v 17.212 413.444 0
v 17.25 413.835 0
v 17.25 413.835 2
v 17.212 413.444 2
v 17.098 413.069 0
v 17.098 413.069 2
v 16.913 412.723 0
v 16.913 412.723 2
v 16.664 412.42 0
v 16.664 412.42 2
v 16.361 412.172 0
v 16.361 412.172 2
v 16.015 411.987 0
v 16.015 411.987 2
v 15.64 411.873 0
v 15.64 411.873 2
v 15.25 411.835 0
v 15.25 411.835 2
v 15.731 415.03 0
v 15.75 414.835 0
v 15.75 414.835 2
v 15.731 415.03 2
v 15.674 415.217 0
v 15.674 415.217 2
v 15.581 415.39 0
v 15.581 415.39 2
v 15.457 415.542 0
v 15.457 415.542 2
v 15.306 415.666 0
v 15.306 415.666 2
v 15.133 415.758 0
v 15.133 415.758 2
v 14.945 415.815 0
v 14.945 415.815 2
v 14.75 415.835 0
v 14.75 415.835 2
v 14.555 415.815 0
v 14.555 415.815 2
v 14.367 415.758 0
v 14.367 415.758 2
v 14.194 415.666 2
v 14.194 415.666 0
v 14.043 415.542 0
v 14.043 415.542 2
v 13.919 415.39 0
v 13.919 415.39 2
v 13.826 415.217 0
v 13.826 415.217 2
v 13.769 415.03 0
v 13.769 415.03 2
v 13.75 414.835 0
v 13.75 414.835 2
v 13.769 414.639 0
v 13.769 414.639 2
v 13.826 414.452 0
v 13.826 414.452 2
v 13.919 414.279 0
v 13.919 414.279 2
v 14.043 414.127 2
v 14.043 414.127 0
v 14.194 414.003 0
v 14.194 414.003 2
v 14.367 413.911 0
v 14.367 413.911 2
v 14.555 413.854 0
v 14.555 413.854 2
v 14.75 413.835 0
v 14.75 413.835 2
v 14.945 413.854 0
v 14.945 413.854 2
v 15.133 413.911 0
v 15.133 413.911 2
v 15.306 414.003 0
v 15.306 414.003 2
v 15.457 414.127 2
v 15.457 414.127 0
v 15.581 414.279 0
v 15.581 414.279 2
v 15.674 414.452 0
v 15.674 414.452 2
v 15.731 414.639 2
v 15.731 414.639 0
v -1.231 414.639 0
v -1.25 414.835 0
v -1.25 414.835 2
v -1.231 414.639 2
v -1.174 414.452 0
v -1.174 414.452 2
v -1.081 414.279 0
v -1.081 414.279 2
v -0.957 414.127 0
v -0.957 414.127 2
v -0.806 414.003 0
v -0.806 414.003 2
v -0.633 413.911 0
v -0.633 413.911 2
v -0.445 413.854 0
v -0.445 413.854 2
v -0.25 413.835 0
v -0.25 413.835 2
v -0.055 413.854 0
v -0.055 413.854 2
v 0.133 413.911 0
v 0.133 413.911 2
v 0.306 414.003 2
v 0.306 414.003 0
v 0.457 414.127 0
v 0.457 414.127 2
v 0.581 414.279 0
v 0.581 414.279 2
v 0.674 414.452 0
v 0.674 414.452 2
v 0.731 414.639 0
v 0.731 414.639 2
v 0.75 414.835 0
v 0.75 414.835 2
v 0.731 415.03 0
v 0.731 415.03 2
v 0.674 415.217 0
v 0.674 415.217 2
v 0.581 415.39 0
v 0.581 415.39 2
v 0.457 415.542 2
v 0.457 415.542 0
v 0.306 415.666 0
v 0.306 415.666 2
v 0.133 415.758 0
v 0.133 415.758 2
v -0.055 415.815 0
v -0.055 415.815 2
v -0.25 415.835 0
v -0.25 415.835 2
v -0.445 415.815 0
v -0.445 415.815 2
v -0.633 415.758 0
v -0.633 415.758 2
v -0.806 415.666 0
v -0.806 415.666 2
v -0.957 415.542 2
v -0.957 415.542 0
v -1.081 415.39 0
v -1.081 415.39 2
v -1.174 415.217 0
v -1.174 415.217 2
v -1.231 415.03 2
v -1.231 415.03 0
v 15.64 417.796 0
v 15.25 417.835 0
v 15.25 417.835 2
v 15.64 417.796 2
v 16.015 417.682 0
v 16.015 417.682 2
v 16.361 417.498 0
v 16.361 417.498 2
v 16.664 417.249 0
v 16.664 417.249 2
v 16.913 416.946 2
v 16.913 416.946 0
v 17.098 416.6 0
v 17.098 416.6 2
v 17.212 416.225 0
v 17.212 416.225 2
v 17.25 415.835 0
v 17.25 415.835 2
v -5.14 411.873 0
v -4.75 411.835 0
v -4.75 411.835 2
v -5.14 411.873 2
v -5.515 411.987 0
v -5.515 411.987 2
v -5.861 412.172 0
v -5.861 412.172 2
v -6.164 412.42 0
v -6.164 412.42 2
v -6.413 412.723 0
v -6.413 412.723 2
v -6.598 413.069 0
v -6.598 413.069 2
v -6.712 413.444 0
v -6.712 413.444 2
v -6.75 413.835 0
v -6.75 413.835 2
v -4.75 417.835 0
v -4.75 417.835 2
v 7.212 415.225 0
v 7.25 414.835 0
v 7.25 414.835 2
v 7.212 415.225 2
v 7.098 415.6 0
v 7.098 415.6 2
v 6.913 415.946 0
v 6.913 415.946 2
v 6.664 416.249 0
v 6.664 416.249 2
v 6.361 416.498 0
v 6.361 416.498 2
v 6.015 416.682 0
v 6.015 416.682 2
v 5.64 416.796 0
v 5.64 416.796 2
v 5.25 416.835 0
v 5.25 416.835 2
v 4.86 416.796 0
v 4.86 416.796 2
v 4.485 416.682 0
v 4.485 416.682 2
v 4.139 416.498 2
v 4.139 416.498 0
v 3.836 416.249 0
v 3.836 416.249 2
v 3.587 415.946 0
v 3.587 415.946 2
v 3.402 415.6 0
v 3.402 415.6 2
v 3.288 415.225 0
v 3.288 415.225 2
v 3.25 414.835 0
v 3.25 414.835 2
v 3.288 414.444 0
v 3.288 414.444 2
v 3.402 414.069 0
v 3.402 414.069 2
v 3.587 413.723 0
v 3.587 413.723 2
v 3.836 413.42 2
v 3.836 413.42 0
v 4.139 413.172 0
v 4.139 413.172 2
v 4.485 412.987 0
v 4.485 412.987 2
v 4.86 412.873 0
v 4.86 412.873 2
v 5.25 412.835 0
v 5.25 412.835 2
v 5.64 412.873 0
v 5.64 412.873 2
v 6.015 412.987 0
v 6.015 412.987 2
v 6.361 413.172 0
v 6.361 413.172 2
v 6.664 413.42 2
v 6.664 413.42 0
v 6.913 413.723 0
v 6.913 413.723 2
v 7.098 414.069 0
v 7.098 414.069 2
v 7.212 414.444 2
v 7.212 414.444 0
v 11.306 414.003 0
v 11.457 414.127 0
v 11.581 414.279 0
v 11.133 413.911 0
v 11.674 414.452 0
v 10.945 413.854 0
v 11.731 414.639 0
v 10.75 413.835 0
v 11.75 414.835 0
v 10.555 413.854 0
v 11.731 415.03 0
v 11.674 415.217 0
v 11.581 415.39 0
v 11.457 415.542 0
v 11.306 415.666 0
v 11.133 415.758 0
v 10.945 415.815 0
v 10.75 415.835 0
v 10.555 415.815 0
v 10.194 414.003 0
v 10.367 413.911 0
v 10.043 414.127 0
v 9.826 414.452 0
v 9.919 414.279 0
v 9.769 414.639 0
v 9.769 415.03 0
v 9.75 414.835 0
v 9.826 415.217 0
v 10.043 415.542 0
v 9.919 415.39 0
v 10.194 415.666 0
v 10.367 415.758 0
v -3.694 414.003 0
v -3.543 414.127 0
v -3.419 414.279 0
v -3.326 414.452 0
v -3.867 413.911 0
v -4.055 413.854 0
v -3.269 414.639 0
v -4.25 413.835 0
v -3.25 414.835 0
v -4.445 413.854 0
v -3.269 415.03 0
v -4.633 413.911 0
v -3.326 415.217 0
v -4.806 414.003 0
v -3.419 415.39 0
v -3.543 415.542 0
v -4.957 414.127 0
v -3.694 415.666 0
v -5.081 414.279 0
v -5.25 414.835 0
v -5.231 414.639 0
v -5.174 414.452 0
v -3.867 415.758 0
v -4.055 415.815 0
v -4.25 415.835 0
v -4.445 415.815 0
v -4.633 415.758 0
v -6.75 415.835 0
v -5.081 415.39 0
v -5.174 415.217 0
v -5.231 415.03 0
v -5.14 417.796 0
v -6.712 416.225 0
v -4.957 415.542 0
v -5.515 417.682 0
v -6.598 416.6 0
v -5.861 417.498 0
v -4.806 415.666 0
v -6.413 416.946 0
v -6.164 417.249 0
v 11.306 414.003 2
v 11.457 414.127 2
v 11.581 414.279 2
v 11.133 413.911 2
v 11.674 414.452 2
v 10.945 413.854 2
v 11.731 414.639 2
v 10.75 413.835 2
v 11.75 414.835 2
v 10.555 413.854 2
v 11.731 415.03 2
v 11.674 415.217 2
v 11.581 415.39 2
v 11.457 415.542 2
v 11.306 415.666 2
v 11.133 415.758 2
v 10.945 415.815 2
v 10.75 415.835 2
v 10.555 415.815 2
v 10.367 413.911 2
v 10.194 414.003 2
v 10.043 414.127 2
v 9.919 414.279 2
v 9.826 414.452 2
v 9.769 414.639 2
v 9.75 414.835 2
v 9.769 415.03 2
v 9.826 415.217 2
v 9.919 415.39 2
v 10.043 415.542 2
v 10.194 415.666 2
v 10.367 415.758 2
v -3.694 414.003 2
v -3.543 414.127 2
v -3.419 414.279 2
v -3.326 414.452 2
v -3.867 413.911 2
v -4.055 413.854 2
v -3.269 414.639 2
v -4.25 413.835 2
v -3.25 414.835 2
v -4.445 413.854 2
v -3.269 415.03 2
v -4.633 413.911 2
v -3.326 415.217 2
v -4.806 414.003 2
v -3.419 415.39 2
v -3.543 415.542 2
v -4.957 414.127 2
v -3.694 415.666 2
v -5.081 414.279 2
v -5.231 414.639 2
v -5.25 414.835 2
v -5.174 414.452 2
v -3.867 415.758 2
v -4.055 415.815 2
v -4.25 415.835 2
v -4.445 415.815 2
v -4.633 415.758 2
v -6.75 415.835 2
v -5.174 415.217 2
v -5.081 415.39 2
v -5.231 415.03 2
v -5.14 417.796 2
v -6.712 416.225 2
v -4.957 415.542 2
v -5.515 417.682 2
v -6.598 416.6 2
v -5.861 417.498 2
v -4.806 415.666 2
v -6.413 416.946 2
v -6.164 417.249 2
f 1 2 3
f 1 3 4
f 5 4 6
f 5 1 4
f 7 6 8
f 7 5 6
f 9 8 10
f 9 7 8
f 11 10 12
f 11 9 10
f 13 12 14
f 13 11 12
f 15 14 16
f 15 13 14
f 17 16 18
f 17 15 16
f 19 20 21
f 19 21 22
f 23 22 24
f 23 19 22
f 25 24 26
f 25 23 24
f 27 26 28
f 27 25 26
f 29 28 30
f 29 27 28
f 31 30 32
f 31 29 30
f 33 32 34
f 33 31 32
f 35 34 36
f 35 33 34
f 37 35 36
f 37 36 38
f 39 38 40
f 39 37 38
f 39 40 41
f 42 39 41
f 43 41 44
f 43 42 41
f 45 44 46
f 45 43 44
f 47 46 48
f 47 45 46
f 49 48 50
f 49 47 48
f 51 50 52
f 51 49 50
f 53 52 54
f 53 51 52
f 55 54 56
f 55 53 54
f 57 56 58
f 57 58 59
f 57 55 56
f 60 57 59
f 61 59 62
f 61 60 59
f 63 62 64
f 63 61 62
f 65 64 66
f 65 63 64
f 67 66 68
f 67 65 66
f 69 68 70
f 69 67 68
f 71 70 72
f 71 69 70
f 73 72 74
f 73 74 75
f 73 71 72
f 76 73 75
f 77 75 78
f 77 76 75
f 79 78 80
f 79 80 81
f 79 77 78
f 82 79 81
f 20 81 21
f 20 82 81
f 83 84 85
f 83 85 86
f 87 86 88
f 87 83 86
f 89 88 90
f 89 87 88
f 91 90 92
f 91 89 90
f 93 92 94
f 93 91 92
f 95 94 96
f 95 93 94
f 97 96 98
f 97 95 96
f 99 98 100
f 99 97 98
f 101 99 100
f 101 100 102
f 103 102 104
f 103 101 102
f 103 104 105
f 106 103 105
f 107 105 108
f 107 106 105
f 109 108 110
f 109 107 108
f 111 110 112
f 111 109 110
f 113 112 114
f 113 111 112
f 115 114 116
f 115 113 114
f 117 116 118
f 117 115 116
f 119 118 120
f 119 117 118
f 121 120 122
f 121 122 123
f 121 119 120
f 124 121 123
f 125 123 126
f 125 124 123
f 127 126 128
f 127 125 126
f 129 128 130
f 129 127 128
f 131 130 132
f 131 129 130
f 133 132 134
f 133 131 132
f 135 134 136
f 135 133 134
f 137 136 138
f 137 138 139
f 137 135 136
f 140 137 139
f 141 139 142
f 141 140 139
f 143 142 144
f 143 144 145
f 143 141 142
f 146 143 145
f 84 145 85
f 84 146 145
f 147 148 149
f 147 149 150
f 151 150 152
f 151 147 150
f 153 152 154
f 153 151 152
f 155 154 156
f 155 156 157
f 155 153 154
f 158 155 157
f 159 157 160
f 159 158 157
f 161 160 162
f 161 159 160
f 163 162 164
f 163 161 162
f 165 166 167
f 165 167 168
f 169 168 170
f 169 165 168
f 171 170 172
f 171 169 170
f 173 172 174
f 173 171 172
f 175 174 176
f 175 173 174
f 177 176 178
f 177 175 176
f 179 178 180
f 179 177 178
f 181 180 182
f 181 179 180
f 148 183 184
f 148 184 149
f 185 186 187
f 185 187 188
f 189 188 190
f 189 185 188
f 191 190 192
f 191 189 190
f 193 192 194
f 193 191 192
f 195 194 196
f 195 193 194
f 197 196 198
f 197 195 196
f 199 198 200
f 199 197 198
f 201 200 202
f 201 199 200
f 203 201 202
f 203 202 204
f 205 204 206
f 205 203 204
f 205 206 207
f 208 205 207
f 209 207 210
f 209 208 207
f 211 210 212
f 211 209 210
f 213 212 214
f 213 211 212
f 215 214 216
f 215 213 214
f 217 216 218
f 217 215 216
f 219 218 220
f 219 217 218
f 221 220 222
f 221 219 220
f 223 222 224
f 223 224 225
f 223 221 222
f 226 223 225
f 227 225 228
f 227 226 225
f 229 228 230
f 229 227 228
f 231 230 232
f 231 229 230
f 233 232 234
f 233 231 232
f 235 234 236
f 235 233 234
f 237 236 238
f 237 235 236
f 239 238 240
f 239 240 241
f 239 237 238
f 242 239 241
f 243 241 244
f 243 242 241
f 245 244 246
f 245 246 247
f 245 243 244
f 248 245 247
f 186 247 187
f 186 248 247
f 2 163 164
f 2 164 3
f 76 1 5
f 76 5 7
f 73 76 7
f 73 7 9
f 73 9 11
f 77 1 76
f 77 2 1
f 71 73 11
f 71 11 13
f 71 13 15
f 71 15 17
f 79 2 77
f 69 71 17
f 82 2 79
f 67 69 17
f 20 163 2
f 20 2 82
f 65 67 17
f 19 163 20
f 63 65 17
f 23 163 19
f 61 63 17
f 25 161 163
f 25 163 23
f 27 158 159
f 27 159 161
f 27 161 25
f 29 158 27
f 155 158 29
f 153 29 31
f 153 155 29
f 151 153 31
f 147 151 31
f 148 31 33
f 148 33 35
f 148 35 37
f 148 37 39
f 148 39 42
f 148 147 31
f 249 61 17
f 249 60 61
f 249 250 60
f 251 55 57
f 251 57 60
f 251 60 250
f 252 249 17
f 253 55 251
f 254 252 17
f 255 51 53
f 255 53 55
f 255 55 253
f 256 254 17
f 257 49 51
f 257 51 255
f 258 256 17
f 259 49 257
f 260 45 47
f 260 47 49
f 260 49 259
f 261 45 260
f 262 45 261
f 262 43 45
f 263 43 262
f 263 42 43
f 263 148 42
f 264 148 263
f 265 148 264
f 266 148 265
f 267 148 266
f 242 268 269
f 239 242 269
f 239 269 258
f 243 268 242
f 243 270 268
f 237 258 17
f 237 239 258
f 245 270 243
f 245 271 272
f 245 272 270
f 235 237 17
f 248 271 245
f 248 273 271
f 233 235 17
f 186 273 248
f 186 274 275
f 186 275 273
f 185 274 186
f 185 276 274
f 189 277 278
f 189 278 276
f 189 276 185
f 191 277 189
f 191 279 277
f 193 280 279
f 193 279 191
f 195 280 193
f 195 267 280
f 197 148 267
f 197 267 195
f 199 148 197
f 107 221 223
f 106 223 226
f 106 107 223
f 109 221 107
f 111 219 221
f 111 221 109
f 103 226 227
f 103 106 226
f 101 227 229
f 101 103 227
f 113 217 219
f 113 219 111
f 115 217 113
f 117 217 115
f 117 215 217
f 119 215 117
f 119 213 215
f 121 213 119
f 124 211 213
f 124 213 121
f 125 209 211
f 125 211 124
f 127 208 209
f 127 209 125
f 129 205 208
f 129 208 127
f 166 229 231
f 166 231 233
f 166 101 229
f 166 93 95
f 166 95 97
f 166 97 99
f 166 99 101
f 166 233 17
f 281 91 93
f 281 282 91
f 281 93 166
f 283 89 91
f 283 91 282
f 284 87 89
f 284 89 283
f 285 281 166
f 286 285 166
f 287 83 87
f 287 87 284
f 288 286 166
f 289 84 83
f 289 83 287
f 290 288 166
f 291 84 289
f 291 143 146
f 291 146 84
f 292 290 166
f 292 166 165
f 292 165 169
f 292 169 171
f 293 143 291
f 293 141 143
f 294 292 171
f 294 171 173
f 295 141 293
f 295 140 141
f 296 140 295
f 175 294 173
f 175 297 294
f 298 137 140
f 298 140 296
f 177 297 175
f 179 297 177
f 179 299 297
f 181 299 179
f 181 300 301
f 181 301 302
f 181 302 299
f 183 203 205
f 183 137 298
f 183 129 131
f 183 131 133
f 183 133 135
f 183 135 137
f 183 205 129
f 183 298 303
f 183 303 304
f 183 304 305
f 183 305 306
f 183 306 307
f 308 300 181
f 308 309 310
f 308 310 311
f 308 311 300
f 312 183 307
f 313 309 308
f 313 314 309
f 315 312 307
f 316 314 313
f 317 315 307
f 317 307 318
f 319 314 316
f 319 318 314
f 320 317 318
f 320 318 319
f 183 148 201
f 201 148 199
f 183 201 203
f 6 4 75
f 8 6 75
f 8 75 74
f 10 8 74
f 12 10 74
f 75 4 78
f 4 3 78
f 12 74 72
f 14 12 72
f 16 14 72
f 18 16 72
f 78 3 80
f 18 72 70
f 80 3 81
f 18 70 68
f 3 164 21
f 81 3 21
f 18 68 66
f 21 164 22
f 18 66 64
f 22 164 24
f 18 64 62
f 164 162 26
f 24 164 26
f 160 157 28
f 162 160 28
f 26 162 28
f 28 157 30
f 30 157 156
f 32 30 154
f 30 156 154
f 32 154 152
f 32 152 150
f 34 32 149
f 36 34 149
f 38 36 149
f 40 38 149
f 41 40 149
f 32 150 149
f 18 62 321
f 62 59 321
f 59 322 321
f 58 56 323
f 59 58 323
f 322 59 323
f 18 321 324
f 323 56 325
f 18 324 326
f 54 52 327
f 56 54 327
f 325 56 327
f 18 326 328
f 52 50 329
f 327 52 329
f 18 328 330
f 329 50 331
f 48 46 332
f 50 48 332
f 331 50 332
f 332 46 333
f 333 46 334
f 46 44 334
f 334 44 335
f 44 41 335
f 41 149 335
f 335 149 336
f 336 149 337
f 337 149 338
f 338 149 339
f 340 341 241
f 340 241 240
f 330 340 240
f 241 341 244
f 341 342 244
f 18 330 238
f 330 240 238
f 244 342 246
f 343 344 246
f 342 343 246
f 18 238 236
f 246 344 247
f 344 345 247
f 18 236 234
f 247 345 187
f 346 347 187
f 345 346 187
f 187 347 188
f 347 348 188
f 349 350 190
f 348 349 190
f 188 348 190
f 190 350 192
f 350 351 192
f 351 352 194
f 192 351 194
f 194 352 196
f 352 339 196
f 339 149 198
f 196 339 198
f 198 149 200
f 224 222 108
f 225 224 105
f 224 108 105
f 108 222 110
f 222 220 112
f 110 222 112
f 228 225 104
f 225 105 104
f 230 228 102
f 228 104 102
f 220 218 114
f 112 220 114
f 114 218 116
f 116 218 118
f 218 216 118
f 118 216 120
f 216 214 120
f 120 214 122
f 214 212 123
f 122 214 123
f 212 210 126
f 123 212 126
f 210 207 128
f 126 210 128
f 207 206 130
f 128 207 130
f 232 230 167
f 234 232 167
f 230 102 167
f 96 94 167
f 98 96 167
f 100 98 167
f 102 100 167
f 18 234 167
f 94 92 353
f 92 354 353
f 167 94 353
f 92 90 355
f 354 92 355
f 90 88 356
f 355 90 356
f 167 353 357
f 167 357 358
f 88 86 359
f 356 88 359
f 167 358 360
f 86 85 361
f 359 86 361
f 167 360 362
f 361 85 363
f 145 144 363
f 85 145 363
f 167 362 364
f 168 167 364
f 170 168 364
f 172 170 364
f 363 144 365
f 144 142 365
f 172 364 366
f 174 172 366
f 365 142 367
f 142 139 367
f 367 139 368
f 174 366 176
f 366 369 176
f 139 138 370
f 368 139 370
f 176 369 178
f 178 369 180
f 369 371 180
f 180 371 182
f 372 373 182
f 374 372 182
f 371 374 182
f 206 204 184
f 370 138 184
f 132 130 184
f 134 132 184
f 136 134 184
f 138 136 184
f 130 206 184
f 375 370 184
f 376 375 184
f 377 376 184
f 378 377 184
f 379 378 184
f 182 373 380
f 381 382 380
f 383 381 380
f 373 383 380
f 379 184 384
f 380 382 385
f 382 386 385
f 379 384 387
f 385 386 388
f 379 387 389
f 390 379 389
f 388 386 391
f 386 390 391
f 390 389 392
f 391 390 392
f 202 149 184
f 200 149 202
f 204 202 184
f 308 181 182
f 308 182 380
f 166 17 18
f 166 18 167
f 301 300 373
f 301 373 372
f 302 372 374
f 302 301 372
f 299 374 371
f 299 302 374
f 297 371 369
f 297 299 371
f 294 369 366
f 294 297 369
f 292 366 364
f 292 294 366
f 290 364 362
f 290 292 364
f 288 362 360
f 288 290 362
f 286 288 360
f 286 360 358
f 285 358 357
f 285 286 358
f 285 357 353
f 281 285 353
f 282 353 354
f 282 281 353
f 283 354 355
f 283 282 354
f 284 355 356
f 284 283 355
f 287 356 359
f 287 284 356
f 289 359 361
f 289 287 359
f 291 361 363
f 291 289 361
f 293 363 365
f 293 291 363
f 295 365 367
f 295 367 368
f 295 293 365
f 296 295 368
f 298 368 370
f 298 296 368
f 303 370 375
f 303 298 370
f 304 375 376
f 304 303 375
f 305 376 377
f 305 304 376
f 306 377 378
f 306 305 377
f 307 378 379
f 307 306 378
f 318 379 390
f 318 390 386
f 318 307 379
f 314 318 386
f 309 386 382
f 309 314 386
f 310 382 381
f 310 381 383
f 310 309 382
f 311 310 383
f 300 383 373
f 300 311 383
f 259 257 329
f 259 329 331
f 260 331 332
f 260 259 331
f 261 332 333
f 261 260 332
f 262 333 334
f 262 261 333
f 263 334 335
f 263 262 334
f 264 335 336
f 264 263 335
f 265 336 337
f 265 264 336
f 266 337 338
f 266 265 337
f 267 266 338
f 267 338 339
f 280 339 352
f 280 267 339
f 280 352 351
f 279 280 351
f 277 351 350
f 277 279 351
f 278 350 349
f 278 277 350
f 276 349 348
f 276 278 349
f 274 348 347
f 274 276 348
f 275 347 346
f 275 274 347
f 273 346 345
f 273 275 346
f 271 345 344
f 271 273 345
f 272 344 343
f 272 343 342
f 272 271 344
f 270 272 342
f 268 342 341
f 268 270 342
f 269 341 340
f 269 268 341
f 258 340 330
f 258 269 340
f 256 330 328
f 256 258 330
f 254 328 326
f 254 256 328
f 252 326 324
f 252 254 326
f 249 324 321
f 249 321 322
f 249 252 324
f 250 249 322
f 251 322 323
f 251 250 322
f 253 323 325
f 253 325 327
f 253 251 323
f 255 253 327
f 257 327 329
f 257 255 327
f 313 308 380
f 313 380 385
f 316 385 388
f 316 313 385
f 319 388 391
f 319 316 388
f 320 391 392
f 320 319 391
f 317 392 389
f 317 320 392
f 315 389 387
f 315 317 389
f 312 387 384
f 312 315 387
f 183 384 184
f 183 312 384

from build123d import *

# Parameters (mm, degrees)
SKETCH1_R           = 2
SKETCH1_R_2         = 1
BOSS_EXTRUDE1_DEPTH = 2


with BuildPart() as part:
    # Sketch1 → Boss-Extrude1 (new body)
    with BuildSketch(Plane.XY):
        with BuildLine():
            Line((-4.75, 417.834574893), (15.25, 417.834574893))
            ThreePointArc((15.25, 417.834574893), (16.664213562, 417.248788455), (17.25, 415.834574893))
            Line((17.25, 415.834574893), (17.25, 413.834574893))
            ThreePointArc((17.25, 413.834574893), (16.664213562, 412.420361331), (15.25, 411.834574893))
            Line((15.25, 411.834574893), (-4.75, 411.834574893))
            ThreePointArc((-4.75, 411.834574893), (-6.164213562, 412.420361331), (-6.75, 413.834574893))
            Line((-6.75, 413.834574893), (-6.75, 415.834574893))
            ThreePointArc((-6.75, 415.834574893), (-6.164213562, 417.248788455), (-4.75, 417.834574893))
        make_face()
        with Locations((5.25, 414.834574893)):
            Circle(SKETCH1_R, mode=Mode.SUBTRACT)
        with Locations((10.75, 414.834574893)):
            Circle(SKETCH1_R_2, mode=Mode.SUBTRACT)
        with Locations((14.75, 414.834574893)):
            Circle(SKETCH1_R_2, mode=Mode.SUBTRACT)
        with Locations(Location((-0.25, 414.834574893, 0), (0, 0, 180))):
            Circle(SKETCH1_R_2, mode=Mode.SUBTRACT)
        with Locations(Location((-4.25, 414.834574893, 0), (0, 0, 180))):
            Circle(SKETCH1_R_2, mode=Mode.SUBTRACT)
    extrude(amount=BOSS_EXTRUDE1_DEPTH)


solid = part.part
